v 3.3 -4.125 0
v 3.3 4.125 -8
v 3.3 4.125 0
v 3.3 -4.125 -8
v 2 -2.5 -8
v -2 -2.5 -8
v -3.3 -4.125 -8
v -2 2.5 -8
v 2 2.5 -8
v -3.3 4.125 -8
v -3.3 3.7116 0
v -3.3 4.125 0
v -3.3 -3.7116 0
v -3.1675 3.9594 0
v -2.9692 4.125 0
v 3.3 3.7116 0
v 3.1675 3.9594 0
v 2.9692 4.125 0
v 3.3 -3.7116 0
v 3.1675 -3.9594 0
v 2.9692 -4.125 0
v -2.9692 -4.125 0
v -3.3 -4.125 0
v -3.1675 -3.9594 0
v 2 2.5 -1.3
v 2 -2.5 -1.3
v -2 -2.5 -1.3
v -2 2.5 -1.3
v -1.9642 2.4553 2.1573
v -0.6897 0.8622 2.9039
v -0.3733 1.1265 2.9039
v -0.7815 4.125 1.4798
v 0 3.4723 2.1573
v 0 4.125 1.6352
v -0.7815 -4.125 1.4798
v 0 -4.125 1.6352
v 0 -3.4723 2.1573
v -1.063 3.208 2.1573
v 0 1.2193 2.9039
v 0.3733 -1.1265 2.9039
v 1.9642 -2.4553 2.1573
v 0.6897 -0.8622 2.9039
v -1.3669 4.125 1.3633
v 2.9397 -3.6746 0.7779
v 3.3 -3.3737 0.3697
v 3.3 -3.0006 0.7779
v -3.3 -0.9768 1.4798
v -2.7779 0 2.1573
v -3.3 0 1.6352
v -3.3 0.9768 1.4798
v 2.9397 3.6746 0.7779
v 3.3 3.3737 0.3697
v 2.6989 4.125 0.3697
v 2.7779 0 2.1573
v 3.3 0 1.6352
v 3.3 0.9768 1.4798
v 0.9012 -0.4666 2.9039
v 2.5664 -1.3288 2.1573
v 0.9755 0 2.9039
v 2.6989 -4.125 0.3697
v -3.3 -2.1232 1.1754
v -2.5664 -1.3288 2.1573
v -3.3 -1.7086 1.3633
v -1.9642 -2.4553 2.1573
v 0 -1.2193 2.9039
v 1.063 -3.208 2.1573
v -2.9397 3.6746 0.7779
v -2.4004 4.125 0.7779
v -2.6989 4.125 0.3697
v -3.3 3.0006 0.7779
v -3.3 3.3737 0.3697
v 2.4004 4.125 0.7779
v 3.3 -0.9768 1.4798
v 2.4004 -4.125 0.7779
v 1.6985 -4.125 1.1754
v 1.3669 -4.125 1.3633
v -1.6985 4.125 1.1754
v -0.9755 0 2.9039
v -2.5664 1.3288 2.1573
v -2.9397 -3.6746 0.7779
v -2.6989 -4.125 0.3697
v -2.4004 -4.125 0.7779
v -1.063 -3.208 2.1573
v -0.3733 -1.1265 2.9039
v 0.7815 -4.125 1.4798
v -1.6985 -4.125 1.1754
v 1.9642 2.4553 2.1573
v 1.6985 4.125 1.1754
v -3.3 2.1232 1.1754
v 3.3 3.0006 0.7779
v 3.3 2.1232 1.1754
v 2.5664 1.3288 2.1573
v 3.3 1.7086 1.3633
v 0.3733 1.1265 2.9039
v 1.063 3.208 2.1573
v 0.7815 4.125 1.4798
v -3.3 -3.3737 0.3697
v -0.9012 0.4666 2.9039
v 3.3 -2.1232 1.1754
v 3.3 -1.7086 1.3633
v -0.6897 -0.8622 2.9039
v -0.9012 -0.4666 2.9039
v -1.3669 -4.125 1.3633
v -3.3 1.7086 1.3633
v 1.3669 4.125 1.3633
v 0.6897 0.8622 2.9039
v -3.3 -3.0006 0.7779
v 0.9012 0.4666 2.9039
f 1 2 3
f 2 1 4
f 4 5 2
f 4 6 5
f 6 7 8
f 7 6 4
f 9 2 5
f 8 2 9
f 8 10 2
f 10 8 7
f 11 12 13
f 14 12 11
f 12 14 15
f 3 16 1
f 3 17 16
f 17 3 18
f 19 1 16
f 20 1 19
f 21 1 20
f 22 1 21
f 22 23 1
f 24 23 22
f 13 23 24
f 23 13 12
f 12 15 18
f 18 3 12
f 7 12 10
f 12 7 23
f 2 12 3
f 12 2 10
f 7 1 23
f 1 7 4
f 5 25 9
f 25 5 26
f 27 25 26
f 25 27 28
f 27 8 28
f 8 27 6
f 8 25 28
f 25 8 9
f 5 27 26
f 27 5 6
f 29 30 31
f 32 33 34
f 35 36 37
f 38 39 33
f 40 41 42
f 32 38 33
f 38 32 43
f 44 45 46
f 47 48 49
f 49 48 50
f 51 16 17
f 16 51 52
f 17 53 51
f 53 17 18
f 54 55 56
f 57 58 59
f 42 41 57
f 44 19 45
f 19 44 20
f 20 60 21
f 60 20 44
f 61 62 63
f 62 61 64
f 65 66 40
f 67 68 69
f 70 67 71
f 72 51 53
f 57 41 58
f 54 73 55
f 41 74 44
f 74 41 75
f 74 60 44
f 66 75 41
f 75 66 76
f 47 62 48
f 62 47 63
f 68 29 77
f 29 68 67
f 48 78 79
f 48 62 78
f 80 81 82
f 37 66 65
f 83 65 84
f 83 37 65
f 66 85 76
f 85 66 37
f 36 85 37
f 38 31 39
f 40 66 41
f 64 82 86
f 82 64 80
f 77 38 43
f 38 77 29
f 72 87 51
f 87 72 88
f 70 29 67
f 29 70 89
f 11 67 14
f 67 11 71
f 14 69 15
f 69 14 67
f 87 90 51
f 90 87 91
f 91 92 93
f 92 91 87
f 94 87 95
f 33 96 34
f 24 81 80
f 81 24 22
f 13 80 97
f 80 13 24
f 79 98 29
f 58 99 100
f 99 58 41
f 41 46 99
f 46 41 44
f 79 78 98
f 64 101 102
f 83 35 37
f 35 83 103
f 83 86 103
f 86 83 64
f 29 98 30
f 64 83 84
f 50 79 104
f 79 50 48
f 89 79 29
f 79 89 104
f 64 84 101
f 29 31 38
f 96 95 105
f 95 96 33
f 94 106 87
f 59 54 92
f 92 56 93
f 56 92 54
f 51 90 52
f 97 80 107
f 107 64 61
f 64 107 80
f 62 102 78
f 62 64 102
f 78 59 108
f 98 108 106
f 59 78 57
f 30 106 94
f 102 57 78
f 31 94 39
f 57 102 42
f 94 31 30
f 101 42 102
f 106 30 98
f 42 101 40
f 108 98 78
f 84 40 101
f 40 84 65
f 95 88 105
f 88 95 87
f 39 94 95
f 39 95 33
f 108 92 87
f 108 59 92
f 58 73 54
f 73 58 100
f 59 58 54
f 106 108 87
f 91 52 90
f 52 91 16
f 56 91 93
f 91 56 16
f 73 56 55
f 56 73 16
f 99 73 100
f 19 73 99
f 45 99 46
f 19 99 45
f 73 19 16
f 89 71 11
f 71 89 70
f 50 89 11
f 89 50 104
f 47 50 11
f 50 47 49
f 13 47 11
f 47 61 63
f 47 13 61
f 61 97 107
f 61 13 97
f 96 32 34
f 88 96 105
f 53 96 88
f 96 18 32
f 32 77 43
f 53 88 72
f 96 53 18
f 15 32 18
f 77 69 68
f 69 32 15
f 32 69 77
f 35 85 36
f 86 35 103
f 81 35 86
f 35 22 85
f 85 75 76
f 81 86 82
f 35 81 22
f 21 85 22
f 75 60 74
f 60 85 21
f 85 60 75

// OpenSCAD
module sock( thickness=1, l=8, w=4, h=5, slack=0.3, curve=5, toe=3 )
{
    out = w+slack*2+thickness*2;
    
    scale( [1,h/w,1] ) {
    
        translate([-out/2,-out/2,0])
        difference() {
            cube( [out,out,l ]);
            translate([thickness+slack,thickness+slack,thickness+slack]) cube( [w,w,l ]);
        }
        
        intersection() {
            translate( [0,0,curve-toe] ) sphere( r=curve );
            translate( [-out/2,-out/2,-toe] ) cube( [out,out,toe] );
        }
    }
}

module grid( across, down, dist=8 )
{
    dist=8;
    for (y = [0:down-1] ) {
        for (x = [0:across-1] ) {
            translate([dist*x,dist*y,0]) children();
        }
    }
}

mirror( [0,0,1] ) sock();
//mirror( [0,0,1] ) grid(2, 3) sock();
